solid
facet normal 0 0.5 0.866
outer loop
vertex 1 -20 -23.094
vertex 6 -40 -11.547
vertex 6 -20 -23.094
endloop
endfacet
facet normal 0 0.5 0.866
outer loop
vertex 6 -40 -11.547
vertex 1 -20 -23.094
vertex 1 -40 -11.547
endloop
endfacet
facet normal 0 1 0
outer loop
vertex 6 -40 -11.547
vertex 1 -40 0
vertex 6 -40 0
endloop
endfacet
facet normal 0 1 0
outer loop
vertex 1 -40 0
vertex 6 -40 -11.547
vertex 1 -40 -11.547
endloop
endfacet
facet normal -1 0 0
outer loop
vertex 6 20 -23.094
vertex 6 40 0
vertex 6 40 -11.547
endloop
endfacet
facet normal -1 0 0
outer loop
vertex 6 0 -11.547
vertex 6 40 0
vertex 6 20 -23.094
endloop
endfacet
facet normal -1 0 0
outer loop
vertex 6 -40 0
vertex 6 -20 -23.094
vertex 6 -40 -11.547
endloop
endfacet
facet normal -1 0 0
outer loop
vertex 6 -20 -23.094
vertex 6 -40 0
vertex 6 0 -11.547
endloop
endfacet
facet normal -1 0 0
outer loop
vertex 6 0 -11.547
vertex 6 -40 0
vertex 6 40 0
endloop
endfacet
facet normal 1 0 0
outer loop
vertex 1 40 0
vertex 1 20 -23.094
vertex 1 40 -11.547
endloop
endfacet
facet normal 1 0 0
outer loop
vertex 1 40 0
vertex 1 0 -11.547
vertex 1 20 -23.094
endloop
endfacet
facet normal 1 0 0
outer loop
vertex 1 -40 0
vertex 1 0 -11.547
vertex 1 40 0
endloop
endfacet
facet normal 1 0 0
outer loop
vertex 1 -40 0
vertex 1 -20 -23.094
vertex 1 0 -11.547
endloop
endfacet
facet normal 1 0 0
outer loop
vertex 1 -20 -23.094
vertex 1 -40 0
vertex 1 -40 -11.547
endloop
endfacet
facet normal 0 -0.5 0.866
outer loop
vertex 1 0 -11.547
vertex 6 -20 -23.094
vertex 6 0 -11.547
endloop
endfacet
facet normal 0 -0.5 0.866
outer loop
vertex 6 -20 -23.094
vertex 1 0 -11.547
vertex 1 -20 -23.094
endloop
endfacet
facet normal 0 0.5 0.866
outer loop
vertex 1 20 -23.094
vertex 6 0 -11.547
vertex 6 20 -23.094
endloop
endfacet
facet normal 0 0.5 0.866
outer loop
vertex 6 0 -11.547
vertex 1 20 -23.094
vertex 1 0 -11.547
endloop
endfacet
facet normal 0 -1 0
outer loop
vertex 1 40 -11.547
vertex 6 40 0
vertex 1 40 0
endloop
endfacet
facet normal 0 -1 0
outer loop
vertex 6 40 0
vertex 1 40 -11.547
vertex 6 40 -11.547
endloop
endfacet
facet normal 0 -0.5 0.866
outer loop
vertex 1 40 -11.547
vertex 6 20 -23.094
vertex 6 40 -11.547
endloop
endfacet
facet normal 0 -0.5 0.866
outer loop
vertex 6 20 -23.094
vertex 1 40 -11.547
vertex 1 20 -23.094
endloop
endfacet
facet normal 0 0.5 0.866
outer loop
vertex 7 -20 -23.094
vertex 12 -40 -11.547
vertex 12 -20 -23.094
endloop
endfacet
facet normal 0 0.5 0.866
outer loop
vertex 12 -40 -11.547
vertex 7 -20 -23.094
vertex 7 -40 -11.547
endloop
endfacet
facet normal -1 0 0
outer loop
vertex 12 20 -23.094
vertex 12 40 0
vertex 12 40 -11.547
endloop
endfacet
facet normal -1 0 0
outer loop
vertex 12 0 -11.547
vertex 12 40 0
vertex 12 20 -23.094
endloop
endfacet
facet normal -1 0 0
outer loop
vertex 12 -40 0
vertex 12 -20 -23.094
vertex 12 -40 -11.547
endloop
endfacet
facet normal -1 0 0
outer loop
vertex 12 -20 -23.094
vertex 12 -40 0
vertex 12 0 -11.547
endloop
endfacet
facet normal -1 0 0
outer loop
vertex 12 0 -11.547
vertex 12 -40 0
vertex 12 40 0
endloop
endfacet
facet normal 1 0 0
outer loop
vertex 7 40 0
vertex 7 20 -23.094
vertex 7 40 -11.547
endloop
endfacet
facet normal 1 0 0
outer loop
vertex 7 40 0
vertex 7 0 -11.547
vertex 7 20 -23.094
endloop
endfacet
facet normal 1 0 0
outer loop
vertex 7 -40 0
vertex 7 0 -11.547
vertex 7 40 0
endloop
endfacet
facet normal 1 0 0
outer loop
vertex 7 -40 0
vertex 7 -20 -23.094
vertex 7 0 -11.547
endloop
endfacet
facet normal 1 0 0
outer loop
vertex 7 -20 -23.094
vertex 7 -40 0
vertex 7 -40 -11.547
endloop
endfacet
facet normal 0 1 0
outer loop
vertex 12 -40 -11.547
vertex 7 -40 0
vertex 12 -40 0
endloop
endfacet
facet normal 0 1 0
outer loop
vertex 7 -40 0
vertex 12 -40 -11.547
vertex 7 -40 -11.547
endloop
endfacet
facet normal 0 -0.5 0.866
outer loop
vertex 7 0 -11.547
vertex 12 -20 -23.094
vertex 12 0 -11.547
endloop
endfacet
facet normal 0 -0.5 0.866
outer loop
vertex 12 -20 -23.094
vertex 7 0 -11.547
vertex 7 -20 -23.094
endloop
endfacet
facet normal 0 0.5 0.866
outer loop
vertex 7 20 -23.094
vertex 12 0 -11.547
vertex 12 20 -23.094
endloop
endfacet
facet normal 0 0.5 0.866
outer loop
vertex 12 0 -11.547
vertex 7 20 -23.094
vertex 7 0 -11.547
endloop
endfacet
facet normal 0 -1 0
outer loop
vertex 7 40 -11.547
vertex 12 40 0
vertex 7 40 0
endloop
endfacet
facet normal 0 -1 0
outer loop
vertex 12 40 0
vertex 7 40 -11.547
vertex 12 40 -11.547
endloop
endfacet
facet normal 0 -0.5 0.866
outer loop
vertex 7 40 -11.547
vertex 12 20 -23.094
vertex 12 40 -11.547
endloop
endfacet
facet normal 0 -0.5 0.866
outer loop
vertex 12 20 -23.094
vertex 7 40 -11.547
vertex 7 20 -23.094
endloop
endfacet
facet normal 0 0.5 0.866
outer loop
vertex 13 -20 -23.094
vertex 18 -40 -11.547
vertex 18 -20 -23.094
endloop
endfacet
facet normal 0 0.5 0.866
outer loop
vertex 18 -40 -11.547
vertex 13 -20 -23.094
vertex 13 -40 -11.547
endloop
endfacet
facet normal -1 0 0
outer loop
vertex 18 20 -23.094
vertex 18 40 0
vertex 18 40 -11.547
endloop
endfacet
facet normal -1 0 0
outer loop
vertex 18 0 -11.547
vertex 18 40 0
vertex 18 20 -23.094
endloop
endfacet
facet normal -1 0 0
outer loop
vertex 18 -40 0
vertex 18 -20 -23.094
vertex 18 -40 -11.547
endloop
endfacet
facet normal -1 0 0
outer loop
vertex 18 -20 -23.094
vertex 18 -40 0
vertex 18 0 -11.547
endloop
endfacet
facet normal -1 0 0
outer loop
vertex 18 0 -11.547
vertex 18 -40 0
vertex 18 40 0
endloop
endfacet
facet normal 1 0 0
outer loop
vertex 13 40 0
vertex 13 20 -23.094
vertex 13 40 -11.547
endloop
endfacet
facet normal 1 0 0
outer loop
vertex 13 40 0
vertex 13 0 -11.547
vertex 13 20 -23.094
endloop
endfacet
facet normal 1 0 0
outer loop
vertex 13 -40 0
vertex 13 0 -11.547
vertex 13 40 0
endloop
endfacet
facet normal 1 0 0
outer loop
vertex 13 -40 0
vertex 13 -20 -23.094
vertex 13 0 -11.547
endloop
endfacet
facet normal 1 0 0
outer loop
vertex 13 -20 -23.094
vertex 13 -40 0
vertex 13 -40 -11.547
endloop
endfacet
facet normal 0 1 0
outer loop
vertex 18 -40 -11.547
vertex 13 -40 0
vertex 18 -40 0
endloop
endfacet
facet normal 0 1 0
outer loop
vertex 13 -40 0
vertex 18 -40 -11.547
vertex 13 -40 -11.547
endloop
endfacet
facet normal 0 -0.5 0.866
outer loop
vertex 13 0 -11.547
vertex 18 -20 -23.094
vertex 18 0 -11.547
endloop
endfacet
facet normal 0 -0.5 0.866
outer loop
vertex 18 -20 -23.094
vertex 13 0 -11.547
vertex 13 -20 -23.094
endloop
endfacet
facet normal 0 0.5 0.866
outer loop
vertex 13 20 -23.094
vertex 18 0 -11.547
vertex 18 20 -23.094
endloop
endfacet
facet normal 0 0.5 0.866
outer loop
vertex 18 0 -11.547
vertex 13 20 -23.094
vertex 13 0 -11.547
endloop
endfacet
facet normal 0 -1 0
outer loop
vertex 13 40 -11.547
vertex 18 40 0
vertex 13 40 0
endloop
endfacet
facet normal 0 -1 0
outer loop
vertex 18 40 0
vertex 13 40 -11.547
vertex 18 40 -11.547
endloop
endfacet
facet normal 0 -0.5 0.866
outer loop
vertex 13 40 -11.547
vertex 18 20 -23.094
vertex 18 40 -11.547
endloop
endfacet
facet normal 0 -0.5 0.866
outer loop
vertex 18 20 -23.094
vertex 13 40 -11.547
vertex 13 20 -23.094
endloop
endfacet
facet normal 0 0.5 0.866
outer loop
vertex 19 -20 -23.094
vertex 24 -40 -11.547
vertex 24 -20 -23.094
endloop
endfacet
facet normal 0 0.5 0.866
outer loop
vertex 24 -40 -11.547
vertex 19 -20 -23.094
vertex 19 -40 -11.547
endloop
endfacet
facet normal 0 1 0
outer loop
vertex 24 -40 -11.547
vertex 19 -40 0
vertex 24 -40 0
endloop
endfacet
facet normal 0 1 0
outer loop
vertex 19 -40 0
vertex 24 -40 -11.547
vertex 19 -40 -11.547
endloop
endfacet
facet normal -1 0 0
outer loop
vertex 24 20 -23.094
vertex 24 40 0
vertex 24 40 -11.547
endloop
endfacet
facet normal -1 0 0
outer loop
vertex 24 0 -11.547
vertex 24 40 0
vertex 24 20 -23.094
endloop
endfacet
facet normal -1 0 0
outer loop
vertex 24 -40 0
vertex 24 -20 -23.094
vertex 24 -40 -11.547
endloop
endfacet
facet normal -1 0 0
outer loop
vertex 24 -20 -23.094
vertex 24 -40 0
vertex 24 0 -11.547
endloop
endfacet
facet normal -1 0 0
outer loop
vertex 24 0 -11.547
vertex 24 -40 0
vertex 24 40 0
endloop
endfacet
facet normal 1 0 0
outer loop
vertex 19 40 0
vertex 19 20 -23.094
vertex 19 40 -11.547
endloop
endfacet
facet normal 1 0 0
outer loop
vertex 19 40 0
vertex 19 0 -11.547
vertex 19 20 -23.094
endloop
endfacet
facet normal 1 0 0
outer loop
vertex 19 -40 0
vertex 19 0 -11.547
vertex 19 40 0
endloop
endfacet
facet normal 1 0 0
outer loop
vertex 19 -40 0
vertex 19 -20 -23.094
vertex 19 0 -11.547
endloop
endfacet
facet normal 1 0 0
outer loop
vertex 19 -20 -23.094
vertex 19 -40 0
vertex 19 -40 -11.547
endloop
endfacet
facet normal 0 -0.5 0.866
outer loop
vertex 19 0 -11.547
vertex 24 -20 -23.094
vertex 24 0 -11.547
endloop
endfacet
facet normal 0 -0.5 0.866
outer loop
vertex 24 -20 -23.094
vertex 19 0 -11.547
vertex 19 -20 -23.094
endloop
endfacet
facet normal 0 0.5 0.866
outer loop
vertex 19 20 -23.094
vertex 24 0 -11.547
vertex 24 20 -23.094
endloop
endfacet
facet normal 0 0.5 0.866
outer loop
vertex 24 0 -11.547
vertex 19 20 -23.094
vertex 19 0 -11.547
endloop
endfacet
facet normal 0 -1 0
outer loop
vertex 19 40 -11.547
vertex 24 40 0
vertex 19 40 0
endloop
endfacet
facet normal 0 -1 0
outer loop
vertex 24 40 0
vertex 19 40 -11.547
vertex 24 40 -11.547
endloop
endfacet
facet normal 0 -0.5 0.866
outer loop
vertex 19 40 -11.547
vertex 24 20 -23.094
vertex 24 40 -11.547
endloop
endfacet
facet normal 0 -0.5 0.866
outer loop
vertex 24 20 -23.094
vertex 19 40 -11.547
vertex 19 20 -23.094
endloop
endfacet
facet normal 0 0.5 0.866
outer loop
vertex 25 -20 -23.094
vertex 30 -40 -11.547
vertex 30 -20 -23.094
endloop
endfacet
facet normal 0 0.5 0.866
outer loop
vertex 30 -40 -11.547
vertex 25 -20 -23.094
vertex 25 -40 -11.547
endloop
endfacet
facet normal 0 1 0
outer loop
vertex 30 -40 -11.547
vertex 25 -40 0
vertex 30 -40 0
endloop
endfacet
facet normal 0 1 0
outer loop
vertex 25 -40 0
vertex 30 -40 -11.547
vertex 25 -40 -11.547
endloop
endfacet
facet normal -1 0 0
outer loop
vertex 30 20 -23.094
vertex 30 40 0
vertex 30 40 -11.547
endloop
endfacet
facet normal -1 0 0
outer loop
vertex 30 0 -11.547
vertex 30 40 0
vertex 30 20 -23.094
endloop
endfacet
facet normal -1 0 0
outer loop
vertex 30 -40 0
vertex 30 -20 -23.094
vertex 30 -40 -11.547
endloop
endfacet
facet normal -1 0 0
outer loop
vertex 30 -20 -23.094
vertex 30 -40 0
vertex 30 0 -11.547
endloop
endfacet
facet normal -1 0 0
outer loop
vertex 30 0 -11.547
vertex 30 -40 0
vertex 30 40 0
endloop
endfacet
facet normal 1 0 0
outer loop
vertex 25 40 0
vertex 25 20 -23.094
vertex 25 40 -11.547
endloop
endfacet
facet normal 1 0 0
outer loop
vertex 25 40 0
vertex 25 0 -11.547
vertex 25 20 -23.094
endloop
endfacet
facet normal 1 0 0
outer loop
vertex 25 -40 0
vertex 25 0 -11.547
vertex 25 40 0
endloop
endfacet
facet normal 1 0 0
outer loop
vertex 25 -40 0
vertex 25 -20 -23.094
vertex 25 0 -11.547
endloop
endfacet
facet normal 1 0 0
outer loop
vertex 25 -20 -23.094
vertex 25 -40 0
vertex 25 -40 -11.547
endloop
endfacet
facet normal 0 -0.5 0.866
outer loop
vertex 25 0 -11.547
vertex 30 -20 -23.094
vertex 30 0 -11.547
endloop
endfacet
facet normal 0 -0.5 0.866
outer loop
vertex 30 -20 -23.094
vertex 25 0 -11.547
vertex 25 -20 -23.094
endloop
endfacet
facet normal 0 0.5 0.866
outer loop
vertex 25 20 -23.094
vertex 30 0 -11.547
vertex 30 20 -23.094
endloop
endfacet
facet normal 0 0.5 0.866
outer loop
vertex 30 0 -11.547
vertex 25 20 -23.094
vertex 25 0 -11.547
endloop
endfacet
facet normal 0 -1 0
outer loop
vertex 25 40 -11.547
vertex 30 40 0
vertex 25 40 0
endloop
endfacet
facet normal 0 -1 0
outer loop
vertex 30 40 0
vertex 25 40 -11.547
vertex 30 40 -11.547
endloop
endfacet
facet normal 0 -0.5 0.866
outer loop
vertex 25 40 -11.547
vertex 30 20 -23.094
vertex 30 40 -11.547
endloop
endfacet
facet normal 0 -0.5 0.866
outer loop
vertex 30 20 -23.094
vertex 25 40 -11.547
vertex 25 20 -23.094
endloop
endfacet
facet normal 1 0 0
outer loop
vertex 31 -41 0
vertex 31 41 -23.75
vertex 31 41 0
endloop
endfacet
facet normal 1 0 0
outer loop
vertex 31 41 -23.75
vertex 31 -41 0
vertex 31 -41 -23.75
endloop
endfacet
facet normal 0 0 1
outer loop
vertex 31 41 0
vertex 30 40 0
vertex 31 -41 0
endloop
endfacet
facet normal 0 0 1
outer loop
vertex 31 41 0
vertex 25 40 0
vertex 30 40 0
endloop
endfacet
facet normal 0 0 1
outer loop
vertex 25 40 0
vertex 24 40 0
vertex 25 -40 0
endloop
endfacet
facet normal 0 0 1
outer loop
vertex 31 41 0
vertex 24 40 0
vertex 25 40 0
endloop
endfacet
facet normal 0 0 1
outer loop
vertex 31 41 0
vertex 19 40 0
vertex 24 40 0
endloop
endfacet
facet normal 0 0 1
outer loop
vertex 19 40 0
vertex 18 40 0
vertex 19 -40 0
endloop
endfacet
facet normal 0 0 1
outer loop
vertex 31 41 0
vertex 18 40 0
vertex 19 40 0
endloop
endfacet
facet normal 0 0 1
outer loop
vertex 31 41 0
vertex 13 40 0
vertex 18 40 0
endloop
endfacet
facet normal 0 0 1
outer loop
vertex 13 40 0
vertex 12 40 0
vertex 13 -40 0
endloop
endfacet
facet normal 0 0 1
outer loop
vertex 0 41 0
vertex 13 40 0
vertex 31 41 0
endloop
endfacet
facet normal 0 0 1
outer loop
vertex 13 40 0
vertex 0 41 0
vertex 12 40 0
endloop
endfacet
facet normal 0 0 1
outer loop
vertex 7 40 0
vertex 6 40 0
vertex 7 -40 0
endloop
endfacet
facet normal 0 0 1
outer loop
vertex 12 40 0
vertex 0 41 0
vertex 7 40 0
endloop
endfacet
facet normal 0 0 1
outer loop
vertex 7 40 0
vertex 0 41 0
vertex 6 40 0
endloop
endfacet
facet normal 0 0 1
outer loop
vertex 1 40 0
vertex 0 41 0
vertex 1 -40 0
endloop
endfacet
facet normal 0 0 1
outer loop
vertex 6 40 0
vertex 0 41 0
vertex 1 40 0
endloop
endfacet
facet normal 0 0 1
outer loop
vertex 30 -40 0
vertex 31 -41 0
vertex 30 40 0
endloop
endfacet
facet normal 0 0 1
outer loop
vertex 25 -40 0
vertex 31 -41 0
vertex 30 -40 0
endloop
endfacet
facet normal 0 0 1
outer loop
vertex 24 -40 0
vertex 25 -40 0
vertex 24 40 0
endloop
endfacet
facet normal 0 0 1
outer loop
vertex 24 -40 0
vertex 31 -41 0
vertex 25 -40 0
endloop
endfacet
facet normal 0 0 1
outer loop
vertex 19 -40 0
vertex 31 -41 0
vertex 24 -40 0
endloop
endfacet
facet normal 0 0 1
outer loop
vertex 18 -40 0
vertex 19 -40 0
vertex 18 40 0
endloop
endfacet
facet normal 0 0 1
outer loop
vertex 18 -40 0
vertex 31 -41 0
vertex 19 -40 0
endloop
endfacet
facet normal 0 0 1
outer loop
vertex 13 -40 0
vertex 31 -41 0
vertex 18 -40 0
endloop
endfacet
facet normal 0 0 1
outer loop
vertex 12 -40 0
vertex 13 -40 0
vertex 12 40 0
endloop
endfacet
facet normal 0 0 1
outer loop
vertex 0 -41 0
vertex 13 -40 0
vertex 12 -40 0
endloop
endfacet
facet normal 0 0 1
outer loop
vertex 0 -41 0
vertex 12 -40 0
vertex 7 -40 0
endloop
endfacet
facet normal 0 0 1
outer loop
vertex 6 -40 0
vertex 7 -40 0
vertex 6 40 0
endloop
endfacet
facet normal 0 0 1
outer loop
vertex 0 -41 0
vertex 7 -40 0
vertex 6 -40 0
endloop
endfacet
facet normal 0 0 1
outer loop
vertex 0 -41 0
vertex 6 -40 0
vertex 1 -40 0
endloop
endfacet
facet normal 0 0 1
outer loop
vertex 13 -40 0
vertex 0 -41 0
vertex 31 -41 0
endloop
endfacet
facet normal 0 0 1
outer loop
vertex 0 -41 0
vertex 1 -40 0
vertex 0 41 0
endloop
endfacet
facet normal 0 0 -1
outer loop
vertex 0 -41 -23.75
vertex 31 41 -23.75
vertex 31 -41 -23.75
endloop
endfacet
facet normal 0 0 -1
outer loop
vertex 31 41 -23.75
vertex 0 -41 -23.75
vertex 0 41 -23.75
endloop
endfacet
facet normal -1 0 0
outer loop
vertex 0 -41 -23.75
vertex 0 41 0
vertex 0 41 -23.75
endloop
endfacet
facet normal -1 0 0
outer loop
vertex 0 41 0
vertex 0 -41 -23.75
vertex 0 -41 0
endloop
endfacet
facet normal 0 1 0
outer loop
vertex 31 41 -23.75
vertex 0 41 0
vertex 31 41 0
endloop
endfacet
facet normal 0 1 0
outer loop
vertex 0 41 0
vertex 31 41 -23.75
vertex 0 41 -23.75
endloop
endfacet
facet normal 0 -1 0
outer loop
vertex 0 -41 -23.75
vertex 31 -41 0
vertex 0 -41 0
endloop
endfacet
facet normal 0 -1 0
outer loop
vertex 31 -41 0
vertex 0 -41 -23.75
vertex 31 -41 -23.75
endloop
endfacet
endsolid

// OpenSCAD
include <../Scripts/18xx tiles basic functions.scad>
// 5 pcs means 31 mm long
hexes=5;

yt=hex_size+3*width;
zt=1.25*hex_size;
difference() {
    translate([0,-2*yt,-zt]) cube([hexes*6+1,4*yt,zt]);
    for(i=[0:(hexes-1)]){
            translate([1+i*6,-yt+width,0]) rotate([0,90,0]) linear_extrude(5) regular_polygon(6,hex_size+2*width);
            translate([1+i*6,+yt-width,0]) rotate([0,90,0]) linear_extrude(5) regular_polygon(6,hex_size+2*width);
    }
}    
